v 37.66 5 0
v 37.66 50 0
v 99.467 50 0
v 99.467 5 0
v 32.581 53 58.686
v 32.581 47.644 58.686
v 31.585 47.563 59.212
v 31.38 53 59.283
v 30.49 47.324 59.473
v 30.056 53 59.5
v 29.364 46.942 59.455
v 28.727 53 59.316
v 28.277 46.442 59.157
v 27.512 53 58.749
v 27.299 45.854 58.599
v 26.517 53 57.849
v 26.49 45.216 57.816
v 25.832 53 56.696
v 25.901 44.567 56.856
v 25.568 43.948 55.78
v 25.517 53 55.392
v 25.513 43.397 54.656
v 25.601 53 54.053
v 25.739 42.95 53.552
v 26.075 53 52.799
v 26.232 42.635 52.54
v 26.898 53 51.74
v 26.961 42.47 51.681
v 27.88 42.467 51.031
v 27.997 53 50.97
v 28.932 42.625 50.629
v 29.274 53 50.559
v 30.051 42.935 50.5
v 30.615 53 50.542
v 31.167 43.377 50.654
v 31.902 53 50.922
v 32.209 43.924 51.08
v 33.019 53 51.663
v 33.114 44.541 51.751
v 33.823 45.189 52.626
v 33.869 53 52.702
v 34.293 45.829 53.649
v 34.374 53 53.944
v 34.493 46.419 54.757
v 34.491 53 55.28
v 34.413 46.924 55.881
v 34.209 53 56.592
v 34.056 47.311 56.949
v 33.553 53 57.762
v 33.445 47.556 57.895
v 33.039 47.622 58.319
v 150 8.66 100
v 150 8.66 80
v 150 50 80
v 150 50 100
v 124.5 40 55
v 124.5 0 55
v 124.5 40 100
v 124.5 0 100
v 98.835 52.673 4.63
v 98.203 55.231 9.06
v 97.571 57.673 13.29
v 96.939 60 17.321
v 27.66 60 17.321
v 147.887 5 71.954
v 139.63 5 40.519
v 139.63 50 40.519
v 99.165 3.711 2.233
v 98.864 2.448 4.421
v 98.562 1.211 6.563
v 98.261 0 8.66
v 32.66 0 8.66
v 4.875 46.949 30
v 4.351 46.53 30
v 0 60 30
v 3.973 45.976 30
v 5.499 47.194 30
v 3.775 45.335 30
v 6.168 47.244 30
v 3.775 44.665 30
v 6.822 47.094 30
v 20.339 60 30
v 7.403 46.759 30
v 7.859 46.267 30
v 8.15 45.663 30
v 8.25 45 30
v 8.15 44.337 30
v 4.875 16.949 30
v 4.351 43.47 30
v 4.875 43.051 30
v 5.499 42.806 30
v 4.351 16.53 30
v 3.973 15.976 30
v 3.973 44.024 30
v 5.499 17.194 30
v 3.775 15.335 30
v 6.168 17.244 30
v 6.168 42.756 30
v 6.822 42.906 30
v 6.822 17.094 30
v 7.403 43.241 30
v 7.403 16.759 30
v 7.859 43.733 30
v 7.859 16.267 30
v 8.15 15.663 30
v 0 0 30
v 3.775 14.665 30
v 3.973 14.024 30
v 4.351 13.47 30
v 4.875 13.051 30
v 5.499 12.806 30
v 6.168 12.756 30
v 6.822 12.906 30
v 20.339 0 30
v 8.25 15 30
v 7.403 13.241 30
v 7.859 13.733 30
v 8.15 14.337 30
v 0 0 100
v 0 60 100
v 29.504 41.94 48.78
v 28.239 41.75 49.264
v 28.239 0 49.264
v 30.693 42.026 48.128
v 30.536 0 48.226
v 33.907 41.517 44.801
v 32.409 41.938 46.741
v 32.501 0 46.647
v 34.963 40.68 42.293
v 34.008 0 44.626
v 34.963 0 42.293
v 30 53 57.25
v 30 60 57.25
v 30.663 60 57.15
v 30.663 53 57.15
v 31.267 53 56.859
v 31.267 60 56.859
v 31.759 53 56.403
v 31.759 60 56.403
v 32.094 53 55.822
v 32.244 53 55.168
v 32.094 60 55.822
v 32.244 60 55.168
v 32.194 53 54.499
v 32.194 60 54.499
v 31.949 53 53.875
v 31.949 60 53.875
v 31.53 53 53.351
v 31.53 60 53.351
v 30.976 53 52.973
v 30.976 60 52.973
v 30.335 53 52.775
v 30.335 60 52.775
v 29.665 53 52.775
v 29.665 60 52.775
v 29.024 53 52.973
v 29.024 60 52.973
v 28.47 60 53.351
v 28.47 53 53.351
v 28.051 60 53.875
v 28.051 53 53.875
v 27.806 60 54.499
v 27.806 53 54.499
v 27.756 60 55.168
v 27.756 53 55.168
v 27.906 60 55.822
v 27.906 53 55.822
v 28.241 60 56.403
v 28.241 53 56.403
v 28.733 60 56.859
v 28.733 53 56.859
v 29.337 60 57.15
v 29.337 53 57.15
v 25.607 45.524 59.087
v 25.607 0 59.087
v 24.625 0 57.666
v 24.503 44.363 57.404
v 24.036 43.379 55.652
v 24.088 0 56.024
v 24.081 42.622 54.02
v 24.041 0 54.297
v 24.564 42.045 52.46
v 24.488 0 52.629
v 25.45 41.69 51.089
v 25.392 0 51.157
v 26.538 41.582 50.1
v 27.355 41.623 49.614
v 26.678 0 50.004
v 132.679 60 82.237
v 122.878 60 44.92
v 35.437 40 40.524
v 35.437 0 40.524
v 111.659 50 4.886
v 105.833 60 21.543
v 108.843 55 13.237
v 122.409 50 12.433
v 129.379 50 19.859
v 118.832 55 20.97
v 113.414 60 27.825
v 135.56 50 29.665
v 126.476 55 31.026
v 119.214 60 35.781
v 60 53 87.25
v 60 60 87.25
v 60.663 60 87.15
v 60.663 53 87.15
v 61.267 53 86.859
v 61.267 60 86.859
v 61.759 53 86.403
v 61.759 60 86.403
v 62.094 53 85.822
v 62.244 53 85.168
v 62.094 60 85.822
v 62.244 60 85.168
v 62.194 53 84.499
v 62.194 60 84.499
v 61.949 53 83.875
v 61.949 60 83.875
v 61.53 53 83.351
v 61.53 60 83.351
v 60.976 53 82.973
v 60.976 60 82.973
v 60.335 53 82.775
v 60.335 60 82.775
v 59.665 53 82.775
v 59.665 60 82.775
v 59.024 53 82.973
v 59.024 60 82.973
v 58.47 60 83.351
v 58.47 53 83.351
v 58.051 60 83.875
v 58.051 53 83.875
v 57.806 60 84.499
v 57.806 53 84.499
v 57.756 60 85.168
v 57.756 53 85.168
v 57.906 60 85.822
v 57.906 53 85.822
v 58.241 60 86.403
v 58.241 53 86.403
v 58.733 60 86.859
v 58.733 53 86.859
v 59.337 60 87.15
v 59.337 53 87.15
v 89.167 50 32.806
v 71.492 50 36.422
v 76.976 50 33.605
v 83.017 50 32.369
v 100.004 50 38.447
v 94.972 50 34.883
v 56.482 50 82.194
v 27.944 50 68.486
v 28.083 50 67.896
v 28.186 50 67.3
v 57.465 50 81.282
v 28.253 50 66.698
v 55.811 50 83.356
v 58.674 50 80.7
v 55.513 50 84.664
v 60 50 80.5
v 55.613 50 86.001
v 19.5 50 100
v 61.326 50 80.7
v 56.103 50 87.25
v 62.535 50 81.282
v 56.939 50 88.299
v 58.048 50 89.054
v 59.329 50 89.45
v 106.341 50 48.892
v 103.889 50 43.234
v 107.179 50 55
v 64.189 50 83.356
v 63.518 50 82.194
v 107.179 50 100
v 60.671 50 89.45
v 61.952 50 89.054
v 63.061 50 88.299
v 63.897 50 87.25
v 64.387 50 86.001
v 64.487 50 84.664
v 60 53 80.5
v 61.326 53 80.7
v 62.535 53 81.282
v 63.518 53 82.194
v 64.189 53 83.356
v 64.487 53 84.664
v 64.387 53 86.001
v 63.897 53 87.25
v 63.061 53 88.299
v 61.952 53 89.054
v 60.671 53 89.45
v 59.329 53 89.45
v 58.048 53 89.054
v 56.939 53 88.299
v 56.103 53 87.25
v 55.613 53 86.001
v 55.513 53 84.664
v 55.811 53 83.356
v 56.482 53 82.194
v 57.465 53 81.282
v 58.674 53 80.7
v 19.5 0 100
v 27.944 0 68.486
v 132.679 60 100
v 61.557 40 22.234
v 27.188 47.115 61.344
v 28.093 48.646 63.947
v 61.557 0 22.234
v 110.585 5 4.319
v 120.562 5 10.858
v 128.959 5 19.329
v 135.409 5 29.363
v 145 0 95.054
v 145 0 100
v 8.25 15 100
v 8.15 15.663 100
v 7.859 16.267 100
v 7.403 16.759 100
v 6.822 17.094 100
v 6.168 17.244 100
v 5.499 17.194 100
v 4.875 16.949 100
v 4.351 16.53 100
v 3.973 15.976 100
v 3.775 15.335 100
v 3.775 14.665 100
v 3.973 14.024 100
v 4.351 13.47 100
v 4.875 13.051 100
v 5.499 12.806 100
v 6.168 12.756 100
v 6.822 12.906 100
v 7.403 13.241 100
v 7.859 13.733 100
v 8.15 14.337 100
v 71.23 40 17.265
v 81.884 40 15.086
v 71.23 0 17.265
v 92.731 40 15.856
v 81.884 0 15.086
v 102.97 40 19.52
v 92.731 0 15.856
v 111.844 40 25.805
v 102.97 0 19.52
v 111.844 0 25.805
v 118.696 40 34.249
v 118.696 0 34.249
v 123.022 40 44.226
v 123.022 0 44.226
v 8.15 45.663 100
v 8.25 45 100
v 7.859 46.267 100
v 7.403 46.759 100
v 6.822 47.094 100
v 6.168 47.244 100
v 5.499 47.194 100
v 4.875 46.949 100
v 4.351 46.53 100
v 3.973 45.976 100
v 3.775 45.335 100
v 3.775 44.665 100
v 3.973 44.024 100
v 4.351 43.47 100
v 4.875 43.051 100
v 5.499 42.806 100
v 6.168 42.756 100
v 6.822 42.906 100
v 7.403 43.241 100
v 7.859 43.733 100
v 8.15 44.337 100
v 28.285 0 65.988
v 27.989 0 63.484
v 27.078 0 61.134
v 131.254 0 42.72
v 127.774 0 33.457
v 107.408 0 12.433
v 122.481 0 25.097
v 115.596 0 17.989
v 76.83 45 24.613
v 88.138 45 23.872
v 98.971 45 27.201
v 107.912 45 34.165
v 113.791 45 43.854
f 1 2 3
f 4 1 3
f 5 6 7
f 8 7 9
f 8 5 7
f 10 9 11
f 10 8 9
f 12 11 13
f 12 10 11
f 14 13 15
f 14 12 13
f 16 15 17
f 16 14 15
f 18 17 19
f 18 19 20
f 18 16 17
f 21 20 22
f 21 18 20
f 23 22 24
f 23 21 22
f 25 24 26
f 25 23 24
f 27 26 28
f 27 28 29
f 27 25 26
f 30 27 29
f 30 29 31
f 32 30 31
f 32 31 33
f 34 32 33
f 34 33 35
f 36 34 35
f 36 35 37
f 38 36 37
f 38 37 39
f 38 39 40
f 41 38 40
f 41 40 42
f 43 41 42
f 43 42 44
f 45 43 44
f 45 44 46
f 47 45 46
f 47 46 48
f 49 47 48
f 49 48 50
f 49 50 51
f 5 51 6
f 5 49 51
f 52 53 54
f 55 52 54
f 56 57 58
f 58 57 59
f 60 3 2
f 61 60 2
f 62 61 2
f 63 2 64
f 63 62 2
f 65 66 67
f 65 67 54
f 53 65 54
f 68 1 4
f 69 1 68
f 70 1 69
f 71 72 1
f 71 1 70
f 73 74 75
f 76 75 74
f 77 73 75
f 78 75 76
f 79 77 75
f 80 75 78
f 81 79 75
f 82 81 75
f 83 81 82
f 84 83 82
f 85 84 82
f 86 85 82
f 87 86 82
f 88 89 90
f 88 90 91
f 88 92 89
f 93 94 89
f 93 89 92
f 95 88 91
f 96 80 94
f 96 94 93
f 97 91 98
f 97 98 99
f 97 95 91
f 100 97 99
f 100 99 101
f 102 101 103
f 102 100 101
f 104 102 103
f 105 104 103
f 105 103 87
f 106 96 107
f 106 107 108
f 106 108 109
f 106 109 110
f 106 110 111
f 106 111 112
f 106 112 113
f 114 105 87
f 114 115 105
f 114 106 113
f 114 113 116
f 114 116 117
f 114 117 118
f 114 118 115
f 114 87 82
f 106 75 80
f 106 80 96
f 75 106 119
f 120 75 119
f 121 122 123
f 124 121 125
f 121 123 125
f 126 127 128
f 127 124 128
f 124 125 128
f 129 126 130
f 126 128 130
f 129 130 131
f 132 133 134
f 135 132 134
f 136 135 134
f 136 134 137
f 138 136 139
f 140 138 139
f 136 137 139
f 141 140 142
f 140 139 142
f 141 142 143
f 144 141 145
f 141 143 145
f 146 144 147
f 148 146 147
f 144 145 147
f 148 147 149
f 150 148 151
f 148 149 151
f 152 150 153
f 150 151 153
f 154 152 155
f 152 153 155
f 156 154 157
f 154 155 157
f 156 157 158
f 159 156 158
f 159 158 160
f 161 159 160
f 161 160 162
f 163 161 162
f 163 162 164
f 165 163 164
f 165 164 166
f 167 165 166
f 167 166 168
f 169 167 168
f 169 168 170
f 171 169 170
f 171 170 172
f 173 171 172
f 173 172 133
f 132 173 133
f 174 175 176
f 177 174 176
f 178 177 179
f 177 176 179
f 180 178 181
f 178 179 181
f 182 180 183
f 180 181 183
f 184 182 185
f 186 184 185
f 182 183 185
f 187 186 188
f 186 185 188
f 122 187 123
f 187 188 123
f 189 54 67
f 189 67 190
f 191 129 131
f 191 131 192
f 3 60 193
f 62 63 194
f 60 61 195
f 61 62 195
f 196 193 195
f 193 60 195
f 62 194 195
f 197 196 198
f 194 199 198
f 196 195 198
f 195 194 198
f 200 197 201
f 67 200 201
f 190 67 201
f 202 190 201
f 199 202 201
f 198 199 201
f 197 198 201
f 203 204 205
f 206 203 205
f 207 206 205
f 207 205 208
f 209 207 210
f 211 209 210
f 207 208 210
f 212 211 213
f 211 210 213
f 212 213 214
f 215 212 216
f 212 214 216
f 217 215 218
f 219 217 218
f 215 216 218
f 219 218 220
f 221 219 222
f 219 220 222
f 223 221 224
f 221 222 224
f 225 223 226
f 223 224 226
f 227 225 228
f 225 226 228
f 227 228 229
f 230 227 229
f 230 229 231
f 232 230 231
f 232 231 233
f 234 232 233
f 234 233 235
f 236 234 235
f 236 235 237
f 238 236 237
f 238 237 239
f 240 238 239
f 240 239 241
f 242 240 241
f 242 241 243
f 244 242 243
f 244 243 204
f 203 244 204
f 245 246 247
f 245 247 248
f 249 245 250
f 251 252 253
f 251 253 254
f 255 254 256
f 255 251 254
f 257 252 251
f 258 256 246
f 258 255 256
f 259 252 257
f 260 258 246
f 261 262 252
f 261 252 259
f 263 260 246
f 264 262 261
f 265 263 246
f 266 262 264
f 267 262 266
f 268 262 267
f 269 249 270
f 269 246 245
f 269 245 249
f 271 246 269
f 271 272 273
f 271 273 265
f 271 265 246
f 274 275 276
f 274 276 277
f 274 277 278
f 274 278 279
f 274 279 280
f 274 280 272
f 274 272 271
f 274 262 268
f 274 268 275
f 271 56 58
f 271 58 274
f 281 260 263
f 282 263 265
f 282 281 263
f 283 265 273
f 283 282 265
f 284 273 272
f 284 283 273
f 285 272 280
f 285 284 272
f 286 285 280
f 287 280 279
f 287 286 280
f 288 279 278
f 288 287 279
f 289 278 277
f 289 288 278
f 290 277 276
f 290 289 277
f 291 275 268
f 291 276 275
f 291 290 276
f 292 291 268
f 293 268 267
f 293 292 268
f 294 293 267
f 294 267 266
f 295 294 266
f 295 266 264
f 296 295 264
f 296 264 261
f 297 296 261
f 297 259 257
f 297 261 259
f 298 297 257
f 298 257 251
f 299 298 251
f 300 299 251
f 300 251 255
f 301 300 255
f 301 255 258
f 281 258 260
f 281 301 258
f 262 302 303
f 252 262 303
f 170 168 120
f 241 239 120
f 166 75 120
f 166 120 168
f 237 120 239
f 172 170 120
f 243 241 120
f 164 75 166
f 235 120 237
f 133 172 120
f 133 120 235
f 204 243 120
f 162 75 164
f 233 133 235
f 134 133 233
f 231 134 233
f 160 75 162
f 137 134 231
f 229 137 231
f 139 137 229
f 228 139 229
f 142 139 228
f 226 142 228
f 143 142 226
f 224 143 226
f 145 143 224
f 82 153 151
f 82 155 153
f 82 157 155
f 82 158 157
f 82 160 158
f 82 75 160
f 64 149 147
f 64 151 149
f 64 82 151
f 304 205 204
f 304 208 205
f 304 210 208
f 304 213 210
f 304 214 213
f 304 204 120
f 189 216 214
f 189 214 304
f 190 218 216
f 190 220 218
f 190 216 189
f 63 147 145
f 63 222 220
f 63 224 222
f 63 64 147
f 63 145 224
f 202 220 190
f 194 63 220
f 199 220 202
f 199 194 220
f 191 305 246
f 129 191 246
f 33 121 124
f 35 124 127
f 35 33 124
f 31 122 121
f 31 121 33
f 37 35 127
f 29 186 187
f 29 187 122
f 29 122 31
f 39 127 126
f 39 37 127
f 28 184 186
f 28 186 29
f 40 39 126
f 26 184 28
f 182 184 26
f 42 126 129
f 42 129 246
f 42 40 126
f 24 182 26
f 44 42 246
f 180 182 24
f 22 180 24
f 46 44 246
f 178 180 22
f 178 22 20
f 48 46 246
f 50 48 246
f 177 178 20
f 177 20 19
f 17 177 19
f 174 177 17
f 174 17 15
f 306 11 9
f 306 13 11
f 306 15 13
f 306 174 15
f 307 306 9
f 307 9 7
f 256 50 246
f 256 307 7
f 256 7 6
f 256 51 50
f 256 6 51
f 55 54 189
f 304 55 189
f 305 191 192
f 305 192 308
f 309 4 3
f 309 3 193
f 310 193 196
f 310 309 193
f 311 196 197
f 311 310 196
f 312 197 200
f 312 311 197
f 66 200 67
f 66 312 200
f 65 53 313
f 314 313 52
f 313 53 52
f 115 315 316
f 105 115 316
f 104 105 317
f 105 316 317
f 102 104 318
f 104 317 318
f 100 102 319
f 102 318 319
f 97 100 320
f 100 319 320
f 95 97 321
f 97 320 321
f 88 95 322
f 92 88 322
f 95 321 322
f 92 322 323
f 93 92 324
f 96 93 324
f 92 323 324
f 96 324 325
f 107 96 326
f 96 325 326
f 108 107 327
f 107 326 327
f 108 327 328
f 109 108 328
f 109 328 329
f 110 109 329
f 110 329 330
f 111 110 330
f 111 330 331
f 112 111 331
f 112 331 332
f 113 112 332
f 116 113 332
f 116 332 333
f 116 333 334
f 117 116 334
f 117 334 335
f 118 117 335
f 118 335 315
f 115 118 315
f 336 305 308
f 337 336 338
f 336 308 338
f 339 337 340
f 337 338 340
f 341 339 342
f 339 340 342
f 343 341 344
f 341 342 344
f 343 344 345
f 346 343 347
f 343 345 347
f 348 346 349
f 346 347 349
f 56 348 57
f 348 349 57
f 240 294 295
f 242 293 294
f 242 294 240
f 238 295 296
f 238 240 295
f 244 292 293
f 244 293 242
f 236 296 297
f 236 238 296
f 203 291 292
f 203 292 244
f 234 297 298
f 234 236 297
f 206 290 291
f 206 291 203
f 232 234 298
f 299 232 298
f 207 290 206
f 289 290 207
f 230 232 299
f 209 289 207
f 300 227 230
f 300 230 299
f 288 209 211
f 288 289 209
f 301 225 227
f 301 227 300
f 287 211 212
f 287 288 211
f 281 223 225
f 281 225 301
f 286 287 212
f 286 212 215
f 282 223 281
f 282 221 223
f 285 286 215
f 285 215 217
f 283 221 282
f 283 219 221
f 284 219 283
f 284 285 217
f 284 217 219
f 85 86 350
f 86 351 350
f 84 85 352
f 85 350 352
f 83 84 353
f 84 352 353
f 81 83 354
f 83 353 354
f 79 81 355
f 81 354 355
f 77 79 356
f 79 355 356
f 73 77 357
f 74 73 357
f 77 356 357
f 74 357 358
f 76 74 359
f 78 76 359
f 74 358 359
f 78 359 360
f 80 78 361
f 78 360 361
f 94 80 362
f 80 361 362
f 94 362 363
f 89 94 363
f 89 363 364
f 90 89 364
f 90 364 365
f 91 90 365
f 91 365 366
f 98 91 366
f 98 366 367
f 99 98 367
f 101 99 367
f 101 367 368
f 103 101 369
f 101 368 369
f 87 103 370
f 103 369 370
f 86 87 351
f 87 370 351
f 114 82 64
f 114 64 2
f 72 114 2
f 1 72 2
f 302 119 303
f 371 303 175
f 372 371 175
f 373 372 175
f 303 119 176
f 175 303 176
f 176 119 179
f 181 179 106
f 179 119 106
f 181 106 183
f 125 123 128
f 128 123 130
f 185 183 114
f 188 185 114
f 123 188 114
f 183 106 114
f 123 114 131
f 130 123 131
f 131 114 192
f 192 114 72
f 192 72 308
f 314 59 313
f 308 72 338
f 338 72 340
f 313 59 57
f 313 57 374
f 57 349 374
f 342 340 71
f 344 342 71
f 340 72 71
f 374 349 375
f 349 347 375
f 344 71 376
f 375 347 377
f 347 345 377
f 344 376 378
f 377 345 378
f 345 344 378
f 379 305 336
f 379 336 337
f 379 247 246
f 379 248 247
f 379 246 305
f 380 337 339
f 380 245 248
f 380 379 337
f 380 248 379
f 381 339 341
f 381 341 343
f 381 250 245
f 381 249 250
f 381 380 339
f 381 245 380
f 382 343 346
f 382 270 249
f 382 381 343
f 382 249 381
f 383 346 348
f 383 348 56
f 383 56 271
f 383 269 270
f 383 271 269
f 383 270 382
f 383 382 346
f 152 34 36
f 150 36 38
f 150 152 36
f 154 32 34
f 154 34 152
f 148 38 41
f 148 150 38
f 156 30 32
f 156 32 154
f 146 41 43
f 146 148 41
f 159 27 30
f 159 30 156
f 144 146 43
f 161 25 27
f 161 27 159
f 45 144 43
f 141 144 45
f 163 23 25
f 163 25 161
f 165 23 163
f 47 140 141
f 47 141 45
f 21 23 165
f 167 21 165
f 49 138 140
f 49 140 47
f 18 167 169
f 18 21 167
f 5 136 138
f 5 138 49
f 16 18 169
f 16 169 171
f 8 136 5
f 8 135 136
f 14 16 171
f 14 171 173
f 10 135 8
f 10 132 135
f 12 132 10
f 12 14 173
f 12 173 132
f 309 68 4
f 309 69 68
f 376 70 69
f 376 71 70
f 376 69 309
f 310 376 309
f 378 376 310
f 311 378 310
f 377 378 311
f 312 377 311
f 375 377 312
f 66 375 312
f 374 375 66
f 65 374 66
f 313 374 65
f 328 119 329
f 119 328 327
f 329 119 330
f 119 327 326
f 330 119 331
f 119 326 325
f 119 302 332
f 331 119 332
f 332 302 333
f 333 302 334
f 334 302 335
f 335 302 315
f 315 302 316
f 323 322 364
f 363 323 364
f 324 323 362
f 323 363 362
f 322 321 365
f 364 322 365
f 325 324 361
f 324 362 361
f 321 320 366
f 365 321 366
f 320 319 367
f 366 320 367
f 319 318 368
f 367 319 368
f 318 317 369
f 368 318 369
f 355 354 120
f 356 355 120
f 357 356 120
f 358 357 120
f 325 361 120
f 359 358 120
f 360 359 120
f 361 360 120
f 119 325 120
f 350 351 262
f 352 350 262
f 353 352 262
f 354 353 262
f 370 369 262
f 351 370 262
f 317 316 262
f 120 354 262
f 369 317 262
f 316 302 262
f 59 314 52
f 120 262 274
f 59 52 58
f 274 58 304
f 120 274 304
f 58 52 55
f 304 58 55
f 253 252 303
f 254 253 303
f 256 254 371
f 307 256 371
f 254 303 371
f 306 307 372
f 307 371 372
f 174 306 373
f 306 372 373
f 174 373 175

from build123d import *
from OCP.BRepFilletAPI import BRepFilletAPI_MakeChamfer

# Parameters (mm, degrees)
SKETCH_1_W                = 150
SKETCH_1_H                = 60
EXTRUDE_1_DEPTH           = 100
SKETCH_5_R                = 2.25
CUT_EXTRUDE_5_DEPTH       = 191
CUT_EXTRUDE_7_DEPTH       = 50
CUT_EXTRUDE_8_DEPTH       = 191
SKETCH_10_R               = 2.25
CUT_EXTRUDE_9_DEPTH       = 191
SKETCH_11_R               = 6
CUT_EXTRUDE_10_DEPTH      = 50
FILLET_1_R                = 10
CHAMFER_2_SIZE            = 10
CHAMFER_2_SIZE_2          = 17.320508076
CHAMFER_4_SIZE            = 5
CHAMFER_4_SIZE2           = 8.660254038
CUT_EXTRUDE_11_DEPTH      = 10
CUT_EXTRUDE_11_DEPTH_BACK = 3
SKETCH_12_R               = 4.5


with BuildPart() as part:
    # 草图1 → 凸台-拉伸1 (new body)
    with BuildSketch(Plane.XY):
        with Locations((75, 30)):
            Rectangle(SKETCH_1_W, SKETCH_1_H)
    extrude(amount=EXTRUDE_1_DEPTH)

    # 草图5 → 切除-拉伸5 (cut, through all)
    with BuildSketch(Plane.XY.offset(100)):
        with Locations((6, 45)):
            Circle(SKETCH_5_R)
        with Locations((6, 15)):
            Circle(SKETCH_5_R)
    extrude(amount=-CUT_EXTRUDE_5_DEPTH, mode=Mode.SUBTRACT)

    # 草图8 → 切除-拉伸7 (cut)
    with BuildSketch(Plane.XZ):
        with BuildLine():
            Line((124.5, 55), (124.5, 100))
            Line((124.5, 100), (19.5, 100))
            Line((19.5, 100), (35.436672603, 40.523528143))
            Line((35.436672603, 40.523528143), (61.556942546, 22.233918228))
            ThreePointArc((61.556942546, 22.233918228), (102.969944529, 19.519566673), (124.5, 55))
        make_face()
    extrude(amount=-CUT_EXTRUDE_7_DEPTH, mode=Mode.SUBTRACT)

    # 草图9 → 切除-拉伸8 (cut, through all)
    with BuildSketch(Plane.XZ):
        with BuildLine():
            Line((150, 80), (150, 0))
            Line((150, 0), (99.466629547, 0))
            ThreePointArc((99.466629547, 0), (124.98259213, 14.873204284), (139.629974877, 40.519465822))
            Line((139.629974877, 40.519465822), (150, 80))
        make_face()
        Polygon((19.621472223, 30), (27.659947996, 0), (0, 0), (0, 30), align=None)
    extrude(amount=-CUT_EXTRUDE_8_DEPTH, mode=Mode.SUBTRACT)

    # 草图10 → 切除-拉伸9 (cut, through all)
    with BuildSketch(Plane(origin=(0, 60, 0), x_dir=(1, 0, 0), z_dir=(0, 1, 0))):
        with Locations(Location((30, -55, 0), (0, 0, 270))):
            Circle(SKETCH_10_R)
        with Locations(Location((60, -85, 0), (0, 0, 270))):
            Circle(SKETCH_10_R)
    extrude(amount=-CUT_EXTRUDE_9_DEPTH, mode=Mode.SUBTRACT)

    # 草图11 → 切除-拉伸10 (cut)
    with BuildSketch(Plane.XZ):
        with Locations((30, 55)):
            Circle(SKETCH_11_R)
    extrude(amount=-CUT_EXTRUDE_10_DEPTH, mode=Mode.SUBTRACT)

    # 圆角1
    fillet_1_edges = [part.edges().sort_by_distance(p)[0] for p in [
        (32.956659097, 25, 49.779064549),
        (29.950074163, 25, 60.999792281),
    ]]
    fillet(fillet_1_edges, radius=FILLET_1_R)

    # 倒角2
    # the kernel refuses this chamfer: 17.320508076, 10 mm, written as the material it adds along each edge
    with BuildSketch(Plane(origin=(-1.269235366, 50, 66.225281599), x_dir=(-0.0332065552835215, -0.9983227437537926, -0.04742387573893358), z_dir=(0.8191520442889948, 0, -0.5735764363510419))) as chamfer_2_piece_1_section:
        Polygon((CHAMFER_2_SIZE * 0.998322743754, -CHAMFER_2_SIZE * 0.0578938624027), (-CHAMFER_2_SIZE_2 * 0.0578938624016, -CHAMFER_2_SIZE_2 * 0.998322743736), (0, 0), align=None)
    chamfer_2_piece_1 = extrude(amount=76.696601504, mode=Mode.PRIVATE)
    chamfer_2_piece_1 = split(chamfer_2_piece_1, bisect_by=Plane(origin=(0, 46.853516386, 53.66836115), z_dir=(1, 0, 0)), keep=Keep.TOP, mode=Mode.PRIVATE)
    chamfer_2_piece_1 = chamfer_2_piece_1 - Plane(origin=(6, 45, 53.66836115), x_dir=(1, 0, 0), z_dir=(0, 0, 1)) * Cylinder(2.25, 223, mode=Mode.PRIVATE)
    chamfer_2_piece_1 = chamfer_2_piece_1 - Plane(origin=(30, 46.853516386, 55), x_dir=(0, 0, 1), z_dir=(0, 1, 0)) * Cylinder(2.25, 223, mode=Mode.PRIVATE)
    add(chamfer_2_piece_1)
    with BuildSketch(Plane(origin=(124.5, 50, 55), x_dir=(0.05789386240267183, -0.9983227437537926, 0), z_dir=(0, 0, 1))) as chamfer_2_piece_2:
        Polygon((CHAMFER_2_SIZE * 0.998322743754, -CHAMFER_2_SIZE * 0.0578938624027), (-CHAMFER_2_SIZE_2 * 0.0578938624016, -CHAMFER_2_SIZE_2 * 0.998322743736), (0, 0), align=None)
    extrude(amount=45)
    with BuildSketch(Plane(origin=(84.5, 50, 55), x_dir=(-0.5735764363510413, 0, -0.8191520442889951), z_dir=(-0.8191520442889951, 0, 0.5735764363510413))) as chamfer_2_piece_3:
        Polygon((40, CHAMFER_2_SIZE), (40 - CHAMFER_2_SIZE_2, 0), (40, 0), align=None)
    revolve(axis=Axis((84.5, 50, 55), (0, -1, 0)), revolution_arc=125)

    # 倒角3
    # the kernel refuses this chamfer: 33.46065215, 17.320508076, 10 mm, written as the material it takes off along each edge
    with BuildSketch(Plane(origin=(27.659947996, -34.755198876, 0), x_dir=(-0.2684337130154822, 0, 0.9632981582649901), z_dir=(0, 1, 0))) as chamfer_3_piece_1_section:
        with BuildLine():
            Line((34.755198876, 0), (-3.980545955, 9.966488807))
            Line((-3.980545955, 9.966488807), (-4.625197647, 9.786849465))
            ThreePointArc((-4.625197647, 9.786849465), (-2.076639928, 4.959177295), (-0.644651692, -0.179639342))
            Line((-0.644651692, -0.179639342), (0.006670144, -0.669179801))
            ThreePointArc((0.006670144, -0.669179801), (17.382543222, -0.495983324), (34.76186902, -0.669179801))
            Line((34.76186902, -0.669179801), (34.755198876, 0))
        make_face()
    chamfer_3_piece_1 = extrude(amount=129.510397752, mode=Mode.PRIVATE)
    chamfer_3_piece_1 = split(chamfer_3_piece_1, bisect_by=Plane(origin=(27.837157989, 30, 30), z_dir=(0, 0, -1)), keep=Keep.TOP, mode=Mode.PRIVATE)
    add(chamfer_3_piece_1, mode=Mode.SUBTRACT)
    with BuildSketch(Plane(origin=(139.629974877, 60, 40.519465822), x_dir=(0.05599451192610632, -0.9983227437537928, -0.014707614968315207), z_dir=(0.2540444592557946, 0, 0.9671925417006848))) as chamfer_3_piece_2:
        with BuildLine():
            Line((10.363792898, 0), (-1.383316572, -17.870395769))
            Line((-1.383316572, -17.870395769), (-1.729145715, -17.850340747))
            ThreePointArc((-1.729145715, -17.850340747), (-0.864572857, -8.925170374), (-0.345829143, 0.020055022))
            Line((-0.345829143, 0.020055022), (0.020055022, 0.345829143))
            ThreePointArc((0.020055022, 0.345829143), (5.184583312, 0.04633232), (10.38384792, 0.345829143))
            Line((10.38384792, 0.345829143), (10.363792898, 0))
        make_face()
    extrude(amount=58.743581506, mode=Mode.SUBTRACT)
    with BuildSketch(Plane(origin=(84.5, 60, 55), x_dir=(-0.0488032324708506, 0, -0.9988084123095861), z_dir=(-0.9988084123095861, 0, 0.0488032324708506))) as chamfer_3_piece_3:
        with BuildLine():
            Line((57.6, 10.346410162), (39.079491924, -0.346410162))
            Line((39.079491924, -0.346410162), (39.079491924, -0.692820323))
            ThreePointArc((39.079491924, -0.692820323), (48.039745962, -0.346410162), (57, -0.346410162))
            Line((57, -0.346410162), (57.346410162, 0))
            ThreePointArc((57.346410162, 0), (57.346410162, 5.173205081), (57.946410162, 10.346410162))
            Line((57.946410162, 10.346410162), (57.6, 10.346410162))
        make_face()
    revolve(axis=Axis((84.5, 60, 55), (0, -1, 0)), revolution_arc=78.080358164, mode=Mode.SUBTRACT)
    with BuildSketch(Plane(origin=(150, 60, 62.076144118), x_dir=(0.057893862402670464, -0.9983227437537926, 0), z_dir=(0, 0, 1))) as chamfer_3_piece_4:
        with BuildLine():
            Line((10.363792898, 0), (-1.383316572, -17.870395769))
            Line((-1.383316572, -17.870395769), (-1.729145715, -17.850340747))
            ThreePointArc((-1.729145715, -17.850340747), (-0.864572857, -8.925170374), (-0.345829143, 0.020055022))
            Line((-0.345829143, 0.020055022), (0.020055022, 0.345829143))
            ThreePointArc((0.020055022, 0.345829143), (5.184583312, 0.04633232), (10.38384792, 0.345829143))
            Line((10.38384792, 0.345829143), (10.363792898, 0))
        make_face()
    extrude(amount=55.847711765, mode=Mode.SUBTRACT)
    # the kernel refuses this chamfer: 33.46065215, 17.320508076, 10 mm, written as the material it takes off along each edge
    with BuildSketch(Plane(origin=(99.736475847, 60, 0), x_dir=(0, -0.9983227437537926, -0.05789386240267141), z_dir=(-1, 0, 0))) as chamfer_3_2_piece_1:
        with BuildLine():
            Line((10.363792898, 0), (-1.383316572, 17.870395769))
            Line((-1.383316572, 17.870395769), (-1.729145715, 17.850340747))
            ThreePointArc((-1.729145715, 17.850340747), (-0.864572857, 8.925170374), (-0.345829143, -0.020055022))
            Line((-0.345829143, -0.020055022), (0.020055022, -0.345829143))
            ThreePointArc((0.020055022, -0.345829143), (5.184583312, -0.04633232), (10.38384792, -0.345829143))
            Line((10.38384792, -0.345829143), (10.363792898, 0))
        make_face()
    extrude(amount=80.000383734, mode=Mode.SUBTRACT)

    # 倒角4: one chamfer whose edges measure the first distance from different faces: ONE call of the kernel's chamfer builder (chamfer() names one face for all edges)
    chamfer_4_edges_1 = [part.edges().sort_by_distance(p)[0] for p in [
        (68.563288771, 0, 0),
    ]]
    chamfer_4_side_1 = [part.faces().sort_by_distance(p)[0] for p in [
        (68.563288771, 25, 0),
    ]]
    chamfer_4_edges_2 = [part.edges().sort_by_distance(p)[0] for p in [
        (124.98259213, 0, 14.873204284),
    ]]
    chamfer_4_side_2 = [part.faces().sort_by_distance(p)[0] for p in [
        (124.98259213, 25, 14.873204284),
    ]]
    chamfer_4_edges_3 = [part.edges().sort_by_distance(p)[0] for p in [
        (144.814987438, 0, 60.259732911),
    ]]
    chamfer_4_side_3 = [part.faces().sort_by_distance(p)[0] for p in [
        (144.814987438, 25, 60.259732911),
    ]]
    chamfer_4_edges_4 = [part.edges().sort_by_distance(p)[0] for p in [
        (150, 0, 90),
    ]]
    chamfer_4_side_4 = [part.faces().sort_by_distance(p)[0] for p in [
        (31.203351809, 0, 45.395528881),
    ]]
    chamfer_4 = BRepFilletAPI_MakeChamfer(part.part.solid().wrapped)
    for e in chamfer_4_edges_1:
        chamfer_4.Add(CHAMFER_4_SIZE, CHAMFER_4_SIZE2, e.wrapped, chamfer_4_side_1[0].wrapped)  # the first distance lies on this face
    for e in chamfer_4_edges_2:
        chamfer_4.Add(CHAMFER_4_SIZE, CHAMFER_4_SIZE2, e.wrapped, chamfer_4_side_2[0].wrapped)  # the first distance lies on this face
    for e in chamfer_4_edges_3:
        chamfer_4.Add(CHAMFER_4_SIZE, CHAMFER_4_SIZE2, e.wrapped, chamfer_4_side_3[0].wrapped)  # the first distance lies on this face
    for e in chamfer_4_edges_4:
        chamfer_4.Add(CHAMFER_4_SIZE, CHAMFER_4_SIZE2, e.wrapped, chamfer_4_side_4[0].wrapped)  # the first distance lies on this face
    add(Compound.cast(chamfer_4.Shape()), mode=Mode.REPLACE)

    # 草图12 → 切除-拉伸11 (cut, two sides: drawn at the far end of the back side and taken through both)
    with BuildSketch(Plane.XZ.offset(-50).offset(-CUT_EXTRUDE_11_DEPTH_BACK)):
        with Locations(Location((30, 55, 0), (0, 0, 55))):
            Circle(SKETCH_12_R)
        with Locations(Location((60, 85, 0), (0, 0, 270))):
            Circle(SKETCH_12_R)
    extrude(amount=CUT_EXTRUDE_11_DEPTH + CUT_EXTRUDE_11_DEPTH_BACK, mode=Mode.SUBTRACT)


solid = part.part
